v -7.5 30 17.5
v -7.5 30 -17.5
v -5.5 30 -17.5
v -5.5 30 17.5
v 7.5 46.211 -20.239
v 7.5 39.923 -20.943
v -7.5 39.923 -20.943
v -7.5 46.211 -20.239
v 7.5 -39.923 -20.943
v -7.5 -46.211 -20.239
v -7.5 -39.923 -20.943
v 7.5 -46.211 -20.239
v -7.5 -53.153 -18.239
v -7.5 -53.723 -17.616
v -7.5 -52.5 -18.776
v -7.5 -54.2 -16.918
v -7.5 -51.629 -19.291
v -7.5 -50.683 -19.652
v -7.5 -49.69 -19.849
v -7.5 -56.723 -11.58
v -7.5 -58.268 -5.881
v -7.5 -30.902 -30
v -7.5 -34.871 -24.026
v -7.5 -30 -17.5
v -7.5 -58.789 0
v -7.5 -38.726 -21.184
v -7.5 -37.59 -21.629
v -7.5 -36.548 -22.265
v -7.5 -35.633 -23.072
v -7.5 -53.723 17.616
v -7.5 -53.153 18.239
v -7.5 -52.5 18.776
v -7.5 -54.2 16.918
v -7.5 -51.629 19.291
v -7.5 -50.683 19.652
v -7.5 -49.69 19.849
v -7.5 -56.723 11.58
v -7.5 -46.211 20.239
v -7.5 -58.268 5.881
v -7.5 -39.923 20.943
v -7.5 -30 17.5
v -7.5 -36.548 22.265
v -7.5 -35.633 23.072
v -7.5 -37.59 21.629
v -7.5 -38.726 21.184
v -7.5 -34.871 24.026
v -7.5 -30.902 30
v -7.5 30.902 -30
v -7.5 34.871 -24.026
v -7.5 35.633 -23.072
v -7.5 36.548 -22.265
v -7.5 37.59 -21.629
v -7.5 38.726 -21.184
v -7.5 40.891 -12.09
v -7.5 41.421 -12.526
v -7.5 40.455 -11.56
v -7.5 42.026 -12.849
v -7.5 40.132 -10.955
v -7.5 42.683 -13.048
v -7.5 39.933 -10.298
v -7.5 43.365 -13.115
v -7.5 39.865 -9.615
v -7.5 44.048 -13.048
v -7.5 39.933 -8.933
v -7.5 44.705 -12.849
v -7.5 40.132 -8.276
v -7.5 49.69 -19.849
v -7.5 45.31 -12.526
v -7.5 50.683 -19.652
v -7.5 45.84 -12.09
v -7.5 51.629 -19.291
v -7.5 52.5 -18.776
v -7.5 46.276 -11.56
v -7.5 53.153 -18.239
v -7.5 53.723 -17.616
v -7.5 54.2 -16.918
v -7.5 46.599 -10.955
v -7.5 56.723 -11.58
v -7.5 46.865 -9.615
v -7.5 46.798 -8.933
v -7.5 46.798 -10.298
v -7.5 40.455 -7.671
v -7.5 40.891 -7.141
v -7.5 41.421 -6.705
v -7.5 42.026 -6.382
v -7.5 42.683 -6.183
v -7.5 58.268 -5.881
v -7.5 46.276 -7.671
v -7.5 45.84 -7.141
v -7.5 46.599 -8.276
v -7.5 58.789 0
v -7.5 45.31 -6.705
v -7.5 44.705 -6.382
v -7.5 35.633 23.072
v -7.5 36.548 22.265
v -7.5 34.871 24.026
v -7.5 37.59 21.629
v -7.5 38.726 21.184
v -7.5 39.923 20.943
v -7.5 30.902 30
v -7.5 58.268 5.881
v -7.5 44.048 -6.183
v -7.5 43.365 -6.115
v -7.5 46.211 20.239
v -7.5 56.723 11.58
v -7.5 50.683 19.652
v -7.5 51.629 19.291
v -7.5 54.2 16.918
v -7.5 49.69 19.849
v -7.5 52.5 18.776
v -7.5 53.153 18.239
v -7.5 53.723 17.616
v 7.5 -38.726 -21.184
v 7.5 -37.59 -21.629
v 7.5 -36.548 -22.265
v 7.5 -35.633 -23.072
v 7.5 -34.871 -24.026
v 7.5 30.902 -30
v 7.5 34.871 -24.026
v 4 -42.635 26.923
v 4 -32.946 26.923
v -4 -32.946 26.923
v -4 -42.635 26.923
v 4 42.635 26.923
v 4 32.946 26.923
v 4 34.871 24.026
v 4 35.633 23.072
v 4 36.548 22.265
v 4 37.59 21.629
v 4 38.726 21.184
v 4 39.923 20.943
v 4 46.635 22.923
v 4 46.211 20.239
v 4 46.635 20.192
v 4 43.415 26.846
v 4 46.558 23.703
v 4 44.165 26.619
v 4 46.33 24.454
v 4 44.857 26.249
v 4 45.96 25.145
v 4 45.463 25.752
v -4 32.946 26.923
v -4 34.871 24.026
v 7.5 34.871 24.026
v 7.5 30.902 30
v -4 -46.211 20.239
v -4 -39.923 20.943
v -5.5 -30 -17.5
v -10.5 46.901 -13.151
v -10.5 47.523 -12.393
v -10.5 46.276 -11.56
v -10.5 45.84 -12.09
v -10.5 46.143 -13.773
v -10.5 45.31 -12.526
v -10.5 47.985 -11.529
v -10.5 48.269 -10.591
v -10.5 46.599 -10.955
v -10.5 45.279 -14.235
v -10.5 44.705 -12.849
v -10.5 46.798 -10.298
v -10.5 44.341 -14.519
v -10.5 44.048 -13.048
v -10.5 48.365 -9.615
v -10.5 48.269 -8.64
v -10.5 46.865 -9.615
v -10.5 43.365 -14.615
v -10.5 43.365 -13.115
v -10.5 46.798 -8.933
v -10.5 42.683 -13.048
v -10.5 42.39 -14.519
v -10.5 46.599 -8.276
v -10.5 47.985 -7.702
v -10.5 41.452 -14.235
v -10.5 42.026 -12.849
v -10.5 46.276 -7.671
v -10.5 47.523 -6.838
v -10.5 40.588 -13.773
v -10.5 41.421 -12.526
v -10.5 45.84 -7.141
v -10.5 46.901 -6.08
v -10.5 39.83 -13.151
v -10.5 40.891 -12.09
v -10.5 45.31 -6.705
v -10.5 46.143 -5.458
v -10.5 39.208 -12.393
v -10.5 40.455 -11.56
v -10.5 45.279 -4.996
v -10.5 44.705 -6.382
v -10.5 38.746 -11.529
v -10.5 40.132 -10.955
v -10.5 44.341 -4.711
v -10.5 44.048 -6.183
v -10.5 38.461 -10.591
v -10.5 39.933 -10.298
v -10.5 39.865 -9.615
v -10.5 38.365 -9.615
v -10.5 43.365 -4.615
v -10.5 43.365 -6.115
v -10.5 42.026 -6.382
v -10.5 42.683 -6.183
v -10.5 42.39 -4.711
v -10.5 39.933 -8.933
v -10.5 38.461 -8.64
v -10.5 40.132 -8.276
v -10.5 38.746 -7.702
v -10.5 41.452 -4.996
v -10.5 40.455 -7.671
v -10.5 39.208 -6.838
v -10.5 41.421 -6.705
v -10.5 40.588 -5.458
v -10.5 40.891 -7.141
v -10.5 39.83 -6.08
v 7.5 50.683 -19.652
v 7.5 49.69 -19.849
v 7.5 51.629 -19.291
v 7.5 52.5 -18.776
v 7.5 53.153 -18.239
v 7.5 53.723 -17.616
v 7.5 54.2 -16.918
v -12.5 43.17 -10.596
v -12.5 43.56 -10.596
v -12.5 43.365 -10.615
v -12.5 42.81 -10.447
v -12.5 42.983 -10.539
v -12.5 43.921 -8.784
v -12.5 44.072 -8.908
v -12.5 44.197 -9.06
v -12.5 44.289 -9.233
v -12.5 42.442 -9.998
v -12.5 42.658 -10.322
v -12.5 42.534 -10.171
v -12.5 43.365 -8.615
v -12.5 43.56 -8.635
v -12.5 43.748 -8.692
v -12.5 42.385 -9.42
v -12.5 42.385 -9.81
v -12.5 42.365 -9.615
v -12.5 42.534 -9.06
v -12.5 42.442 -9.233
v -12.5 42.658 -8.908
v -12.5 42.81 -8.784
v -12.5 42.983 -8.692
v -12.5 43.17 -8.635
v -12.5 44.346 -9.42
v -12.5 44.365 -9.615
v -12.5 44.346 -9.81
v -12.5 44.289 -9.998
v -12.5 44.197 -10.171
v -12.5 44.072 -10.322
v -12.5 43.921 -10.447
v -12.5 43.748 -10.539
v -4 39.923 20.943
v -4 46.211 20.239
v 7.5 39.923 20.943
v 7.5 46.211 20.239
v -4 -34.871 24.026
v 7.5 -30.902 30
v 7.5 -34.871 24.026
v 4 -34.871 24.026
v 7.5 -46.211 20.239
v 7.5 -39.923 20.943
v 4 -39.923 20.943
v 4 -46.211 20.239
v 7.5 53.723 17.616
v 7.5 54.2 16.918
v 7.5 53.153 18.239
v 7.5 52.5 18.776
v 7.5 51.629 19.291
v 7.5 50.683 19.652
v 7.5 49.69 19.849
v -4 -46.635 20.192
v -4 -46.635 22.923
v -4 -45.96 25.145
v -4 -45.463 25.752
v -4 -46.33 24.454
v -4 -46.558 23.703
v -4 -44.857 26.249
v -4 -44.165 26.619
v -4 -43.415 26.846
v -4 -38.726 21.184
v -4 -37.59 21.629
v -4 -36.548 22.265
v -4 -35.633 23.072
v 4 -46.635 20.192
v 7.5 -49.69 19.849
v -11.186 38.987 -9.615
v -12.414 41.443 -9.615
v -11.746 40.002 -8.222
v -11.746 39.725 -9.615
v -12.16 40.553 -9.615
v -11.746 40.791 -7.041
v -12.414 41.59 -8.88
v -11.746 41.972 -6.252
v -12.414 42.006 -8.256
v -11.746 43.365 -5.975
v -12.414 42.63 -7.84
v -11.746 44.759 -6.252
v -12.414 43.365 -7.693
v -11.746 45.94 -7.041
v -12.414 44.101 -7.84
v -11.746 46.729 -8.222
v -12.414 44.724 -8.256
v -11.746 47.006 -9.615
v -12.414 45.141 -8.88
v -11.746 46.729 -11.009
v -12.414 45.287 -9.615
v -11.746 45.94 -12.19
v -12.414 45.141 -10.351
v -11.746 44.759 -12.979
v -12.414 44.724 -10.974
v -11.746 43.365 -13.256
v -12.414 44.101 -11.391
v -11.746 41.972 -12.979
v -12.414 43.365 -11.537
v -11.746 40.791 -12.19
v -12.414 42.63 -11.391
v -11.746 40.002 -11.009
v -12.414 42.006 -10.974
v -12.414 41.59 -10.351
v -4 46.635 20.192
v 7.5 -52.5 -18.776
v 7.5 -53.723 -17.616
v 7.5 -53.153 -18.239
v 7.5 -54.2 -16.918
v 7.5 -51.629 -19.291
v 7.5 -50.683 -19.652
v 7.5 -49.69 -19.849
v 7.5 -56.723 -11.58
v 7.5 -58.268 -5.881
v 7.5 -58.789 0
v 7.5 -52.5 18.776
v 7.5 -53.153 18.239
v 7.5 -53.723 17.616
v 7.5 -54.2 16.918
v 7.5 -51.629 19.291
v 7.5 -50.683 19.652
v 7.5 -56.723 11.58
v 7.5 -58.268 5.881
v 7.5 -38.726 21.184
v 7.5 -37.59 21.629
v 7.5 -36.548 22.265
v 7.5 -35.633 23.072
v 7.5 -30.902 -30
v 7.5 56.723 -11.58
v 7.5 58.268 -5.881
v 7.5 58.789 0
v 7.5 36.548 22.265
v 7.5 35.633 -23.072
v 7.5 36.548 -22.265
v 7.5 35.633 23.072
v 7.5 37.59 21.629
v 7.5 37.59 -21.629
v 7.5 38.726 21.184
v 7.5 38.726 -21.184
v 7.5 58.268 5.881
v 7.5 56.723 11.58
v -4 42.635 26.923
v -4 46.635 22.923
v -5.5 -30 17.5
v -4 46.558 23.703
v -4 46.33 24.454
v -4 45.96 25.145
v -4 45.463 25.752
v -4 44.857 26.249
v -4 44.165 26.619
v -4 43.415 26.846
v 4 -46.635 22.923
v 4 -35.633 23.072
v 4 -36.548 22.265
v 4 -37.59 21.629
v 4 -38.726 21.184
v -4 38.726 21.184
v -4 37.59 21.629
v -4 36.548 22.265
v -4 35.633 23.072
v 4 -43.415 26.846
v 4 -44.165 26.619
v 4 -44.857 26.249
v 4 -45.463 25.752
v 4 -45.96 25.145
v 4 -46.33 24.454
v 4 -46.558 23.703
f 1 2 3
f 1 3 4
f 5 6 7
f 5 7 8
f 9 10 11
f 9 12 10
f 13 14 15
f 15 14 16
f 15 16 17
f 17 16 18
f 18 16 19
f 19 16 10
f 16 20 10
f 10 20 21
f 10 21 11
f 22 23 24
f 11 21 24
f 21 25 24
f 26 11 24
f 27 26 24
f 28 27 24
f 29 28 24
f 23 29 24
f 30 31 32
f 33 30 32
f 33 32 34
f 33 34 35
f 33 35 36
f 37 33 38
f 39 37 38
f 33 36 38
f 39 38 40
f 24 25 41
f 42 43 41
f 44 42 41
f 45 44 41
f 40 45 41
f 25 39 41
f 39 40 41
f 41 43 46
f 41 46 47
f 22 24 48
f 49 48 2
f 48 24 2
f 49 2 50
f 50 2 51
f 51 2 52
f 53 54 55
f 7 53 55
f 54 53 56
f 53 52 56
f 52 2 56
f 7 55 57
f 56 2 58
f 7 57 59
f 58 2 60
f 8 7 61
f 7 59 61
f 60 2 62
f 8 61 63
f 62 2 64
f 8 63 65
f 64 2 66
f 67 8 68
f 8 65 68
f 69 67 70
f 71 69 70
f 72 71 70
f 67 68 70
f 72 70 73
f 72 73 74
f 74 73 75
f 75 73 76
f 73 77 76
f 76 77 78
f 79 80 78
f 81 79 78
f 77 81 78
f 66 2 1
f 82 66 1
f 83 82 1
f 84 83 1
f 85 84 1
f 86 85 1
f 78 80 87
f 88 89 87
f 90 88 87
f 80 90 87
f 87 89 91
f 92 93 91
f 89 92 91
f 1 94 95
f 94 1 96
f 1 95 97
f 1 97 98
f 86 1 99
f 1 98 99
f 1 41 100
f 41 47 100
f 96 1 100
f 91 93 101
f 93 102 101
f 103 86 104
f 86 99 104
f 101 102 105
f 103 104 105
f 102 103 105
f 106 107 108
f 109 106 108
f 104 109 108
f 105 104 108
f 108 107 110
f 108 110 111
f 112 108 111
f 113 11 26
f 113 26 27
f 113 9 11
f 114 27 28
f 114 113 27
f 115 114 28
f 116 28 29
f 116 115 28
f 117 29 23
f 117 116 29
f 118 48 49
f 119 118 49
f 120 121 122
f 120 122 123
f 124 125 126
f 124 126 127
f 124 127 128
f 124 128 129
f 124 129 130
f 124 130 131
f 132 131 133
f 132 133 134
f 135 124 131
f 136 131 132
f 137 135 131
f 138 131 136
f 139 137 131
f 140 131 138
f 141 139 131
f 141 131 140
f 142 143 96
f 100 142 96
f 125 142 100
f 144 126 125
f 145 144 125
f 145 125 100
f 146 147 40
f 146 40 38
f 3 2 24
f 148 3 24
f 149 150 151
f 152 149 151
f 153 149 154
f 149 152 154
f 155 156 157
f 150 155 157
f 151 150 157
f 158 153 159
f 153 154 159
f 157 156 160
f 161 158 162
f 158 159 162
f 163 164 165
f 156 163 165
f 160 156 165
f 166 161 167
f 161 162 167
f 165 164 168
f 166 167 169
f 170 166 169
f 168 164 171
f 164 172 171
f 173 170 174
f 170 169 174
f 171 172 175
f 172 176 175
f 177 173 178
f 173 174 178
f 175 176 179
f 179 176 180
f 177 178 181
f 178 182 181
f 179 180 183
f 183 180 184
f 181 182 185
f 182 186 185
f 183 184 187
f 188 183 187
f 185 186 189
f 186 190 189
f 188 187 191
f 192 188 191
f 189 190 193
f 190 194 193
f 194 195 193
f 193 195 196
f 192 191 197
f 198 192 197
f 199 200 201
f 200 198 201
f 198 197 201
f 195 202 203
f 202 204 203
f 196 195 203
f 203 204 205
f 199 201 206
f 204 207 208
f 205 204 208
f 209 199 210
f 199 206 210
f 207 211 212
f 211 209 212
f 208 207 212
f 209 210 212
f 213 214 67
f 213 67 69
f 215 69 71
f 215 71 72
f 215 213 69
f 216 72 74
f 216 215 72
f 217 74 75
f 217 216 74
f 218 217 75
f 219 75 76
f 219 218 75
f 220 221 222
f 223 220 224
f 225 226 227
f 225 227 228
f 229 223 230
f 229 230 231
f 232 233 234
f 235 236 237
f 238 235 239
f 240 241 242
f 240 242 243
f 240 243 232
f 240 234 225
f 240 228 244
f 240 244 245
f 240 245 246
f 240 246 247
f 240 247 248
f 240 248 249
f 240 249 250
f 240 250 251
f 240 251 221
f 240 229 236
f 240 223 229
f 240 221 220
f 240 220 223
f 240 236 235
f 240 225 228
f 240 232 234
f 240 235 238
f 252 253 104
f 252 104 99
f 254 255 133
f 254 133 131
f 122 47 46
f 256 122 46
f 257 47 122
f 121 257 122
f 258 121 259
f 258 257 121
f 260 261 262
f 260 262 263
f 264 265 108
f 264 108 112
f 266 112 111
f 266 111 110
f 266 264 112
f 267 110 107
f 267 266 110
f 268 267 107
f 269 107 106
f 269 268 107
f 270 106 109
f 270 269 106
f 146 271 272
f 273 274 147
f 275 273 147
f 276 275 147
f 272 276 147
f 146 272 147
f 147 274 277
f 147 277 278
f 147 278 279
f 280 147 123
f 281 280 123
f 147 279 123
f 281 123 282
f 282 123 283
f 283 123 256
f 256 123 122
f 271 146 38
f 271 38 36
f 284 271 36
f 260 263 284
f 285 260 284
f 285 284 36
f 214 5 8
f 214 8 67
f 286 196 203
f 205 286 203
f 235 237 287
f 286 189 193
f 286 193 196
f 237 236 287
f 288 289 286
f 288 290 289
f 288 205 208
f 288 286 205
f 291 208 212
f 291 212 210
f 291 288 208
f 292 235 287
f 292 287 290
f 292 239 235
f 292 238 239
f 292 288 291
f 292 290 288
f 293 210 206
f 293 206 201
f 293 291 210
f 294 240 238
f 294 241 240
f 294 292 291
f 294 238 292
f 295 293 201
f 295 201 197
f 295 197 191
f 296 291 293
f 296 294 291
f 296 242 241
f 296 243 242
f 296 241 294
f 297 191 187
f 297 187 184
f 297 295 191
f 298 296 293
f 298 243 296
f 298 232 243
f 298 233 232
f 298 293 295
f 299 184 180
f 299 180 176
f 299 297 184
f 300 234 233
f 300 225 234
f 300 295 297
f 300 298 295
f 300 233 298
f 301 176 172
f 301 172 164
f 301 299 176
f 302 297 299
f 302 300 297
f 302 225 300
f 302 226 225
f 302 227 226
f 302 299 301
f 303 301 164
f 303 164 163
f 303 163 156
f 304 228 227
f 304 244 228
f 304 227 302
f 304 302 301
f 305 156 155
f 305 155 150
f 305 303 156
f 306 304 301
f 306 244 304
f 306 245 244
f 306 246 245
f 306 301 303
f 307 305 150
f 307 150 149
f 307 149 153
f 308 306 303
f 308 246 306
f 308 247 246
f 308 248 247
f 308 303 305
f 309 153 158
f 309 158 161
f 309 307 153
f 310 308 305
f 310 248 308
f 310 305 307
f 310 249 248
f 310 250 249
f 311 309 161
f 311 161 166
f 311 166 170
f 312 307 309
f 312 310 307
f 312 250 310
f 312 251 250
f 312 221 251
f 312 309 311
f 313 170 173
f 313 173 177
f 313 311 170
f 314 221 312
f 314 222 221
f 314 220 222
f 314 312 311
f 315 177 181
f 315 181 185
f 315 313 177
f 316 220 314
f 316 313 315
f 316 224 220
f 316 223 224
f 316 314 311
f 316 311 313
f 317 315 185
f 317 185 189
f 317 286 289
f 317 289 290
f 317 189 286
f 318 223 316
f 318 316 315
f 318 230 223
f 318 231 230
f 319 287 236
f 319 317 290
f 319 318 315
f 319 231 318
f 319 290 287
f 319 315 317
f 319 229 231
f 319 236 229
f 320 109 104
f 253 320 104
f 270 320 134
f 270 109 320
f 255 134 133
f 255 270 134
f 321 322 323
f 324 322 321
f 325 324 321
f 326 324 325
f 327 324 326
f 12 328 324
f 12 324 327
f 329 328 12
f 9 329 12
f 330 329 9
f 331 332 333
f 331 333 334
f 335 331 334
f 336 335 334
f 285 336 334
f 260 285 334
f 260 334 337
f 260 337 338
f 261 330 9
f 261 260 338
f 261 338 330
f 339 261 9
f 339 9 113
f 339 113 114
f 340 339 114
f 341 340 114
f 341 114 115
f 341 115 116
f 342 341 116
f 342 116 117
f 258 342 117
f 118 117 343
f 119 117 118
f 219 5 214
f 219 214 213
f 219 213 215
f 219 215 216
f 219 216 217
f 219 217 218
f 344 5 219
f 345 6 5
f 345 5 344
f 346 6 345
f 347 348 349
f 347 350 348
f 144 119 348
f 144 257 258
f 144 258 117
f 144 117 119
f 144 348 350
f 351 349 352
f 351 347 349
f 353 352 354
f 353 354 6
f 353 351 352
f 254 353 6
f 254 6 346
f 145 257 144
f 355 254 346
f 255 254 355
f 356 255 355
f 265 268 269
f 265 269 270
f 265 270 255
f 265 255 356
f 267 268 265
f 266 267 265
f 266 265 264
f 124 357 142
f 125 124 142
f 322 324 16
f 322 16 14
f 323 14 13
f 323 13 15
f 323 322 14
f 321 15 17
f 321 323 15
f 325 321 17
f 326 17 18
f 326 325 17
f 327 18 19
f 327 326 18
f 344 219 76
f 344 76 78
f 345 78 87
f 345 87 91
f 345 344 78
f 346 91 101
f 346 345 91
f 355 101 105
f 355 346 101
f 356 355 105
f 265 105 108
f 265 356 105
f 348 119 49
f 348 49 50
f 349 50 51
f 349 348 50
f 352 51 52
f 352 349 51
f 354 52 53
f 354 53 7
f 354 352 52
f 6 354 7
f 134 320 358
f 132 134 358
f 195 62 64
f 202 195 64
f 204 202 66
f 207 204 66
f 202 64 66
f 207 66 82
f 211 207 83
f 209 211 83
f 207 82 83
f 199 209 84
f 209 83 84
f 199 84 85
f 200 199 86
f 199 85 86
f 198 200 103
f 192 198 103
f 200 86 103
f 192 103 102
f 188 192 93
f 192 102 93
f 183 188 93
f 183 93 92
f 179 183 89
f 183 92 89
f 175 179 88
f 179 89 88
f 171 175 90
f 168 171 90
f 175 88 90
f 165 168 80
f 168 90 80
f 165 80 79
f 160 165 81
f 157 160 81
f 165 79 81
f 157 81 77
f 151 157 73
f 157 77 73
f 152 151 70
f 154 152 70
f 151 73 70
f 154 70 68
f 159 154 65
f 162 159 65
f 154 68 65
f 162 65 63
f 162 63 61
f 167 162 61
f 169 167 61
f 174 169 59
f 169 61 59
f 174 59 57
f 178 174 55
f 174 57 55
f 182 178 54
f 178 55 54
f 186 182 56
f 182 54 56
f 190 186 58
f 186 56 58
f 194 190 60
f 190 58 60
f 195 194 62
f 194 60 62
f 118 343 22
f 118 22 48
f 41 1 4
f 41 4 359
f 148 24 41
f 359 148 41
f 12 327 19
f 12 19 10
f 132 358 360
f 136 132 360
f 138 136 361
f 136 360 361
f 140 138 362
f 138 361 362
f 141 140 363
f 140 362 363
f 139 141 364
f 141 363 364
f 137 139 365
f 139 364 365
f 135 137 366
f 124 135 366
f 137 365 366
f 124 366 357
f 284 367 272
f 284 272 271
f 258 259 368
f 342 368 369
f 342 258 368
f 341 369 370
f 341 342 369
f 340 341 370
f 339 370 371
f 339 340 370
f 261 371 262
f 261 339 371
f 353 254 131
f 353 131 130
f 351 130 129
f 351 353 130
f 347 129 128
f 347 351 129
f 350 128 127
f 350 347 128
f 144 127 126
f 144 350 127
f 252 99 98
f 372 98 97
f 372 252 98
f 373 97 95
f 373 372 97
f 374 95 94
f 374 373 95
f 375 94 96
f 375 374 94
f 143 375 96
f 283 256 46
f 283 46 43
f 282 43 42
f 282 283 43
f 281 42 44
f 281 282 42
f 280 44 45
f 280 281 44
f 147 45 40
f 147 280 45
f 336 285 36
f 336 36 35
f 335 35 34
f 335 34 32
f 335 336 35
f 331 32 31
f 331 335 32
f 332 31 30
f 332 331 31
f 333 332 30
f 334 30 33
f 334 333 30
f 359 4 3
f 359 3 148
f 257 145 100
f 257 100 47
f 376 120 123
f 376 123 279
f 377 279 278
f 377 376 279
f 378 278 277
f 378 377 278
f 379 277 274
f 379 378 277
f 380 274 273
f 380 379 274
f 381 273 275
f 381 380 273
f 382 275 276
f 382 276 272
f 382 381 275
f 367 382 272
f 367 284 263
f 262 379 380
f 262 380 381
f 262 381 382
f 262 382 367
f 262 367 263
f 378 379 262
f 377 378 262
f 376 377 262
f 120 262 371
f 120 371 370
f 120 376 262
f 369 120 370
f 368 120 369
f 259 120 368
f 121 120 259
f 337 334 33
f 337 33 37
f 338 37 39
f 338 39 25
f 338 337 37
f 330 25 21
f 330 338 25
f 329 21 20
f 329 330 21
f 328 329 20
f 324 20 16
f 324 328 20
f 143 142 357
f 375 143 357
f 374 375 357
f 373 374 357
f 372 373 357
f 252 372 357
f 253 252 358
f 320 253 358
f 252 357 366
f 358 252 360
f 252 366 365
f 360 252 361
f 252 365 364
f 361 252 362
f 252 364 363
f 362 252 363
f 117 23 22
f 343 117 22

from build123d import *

# Parameters (mm, degrees)
F1_DEPTH  = 7.5
F3_DEPTH  = 4
F5_R      = 3.5
F6_DEPTH  = 3
F7_R      = 5
F8_DEPTH  = 2
F4_W      = 60
F4_H      = 35
F10_DEPTH = 2


# Not quite as in the source:
# - a fillet or chamfer that OpenCascade refuses, or shapes differently, is made with other operations: its cross-section is extruded or revolved along the edge and cut away or added


with BuildPart() as f1:
    # F0 (on Right) → F1 (new body, symmetric)
    with BuildSketch(Plane.YZ):
        with BuildLine():
            Line((-34.8711436077, -24.0259013658), (-30.9017617255, -30))
            Line((-30.9017617255, -30), (0, -30))
            Line((0, -30), (0, 0))
            Line((0, 0), (-52.5, 0))
            Line((-52.5, 0), (-52.5, -18.7762488504))
            ThreePointArc((-52.5, -18.7762488504), (-51.1634624835, -19.4917800985), (-49.6902439515, -19.8494736223))
            Line((-49.6902439515, -19.8494736223), (-46.2112579103, -20.2390480822))
            Line((-46.2112579103, -20.2390480822), (-39.9225158206, -20.9432570884))
            ThreePointArc((-39.9225158206, -20.9432570884), (-37.0550608987, -21.9245400717), (-34.8711436077, -24.0259013658))
        make_face()
        with BuildLine():
            Line((0, 0), (0, -30))
            Line((0, -30), (30.9017617255, -30))
            Line((30.9017617255, -30), (34.8711436077, -24.0259013658))
            ThreePointArc((34.8711436077, -24.0259013658), (37.0550608987, -21.9245400717), (39.9225158206, -20.9432570884))
            Line((39.9225158206, -20.9432570884), (46.2112579103, -20.2390480822))
            Line((46.2112579103, -20.2390480822), (49.6902439515, -19.8494736223))
            ThreePointArc((49.6902439515, -19.8494736223), (51.1634624835, -19.4917800985), (52.5, -18.7762488504))
            Line((52.5, -18.7762488504), (52.5, 0))
            Line((52.5, 0), (0, 0))
        make_face()
        with BuildLine():
            Line((-52.5, 0), (0, 0))
            Line((0, 0), (0, 30))
            Line((0, 30), (-30.9017617255, 30))
            Line((-30.9017617255, 30), (-34.8711436077, 24.0259013658))
            ThreePointArc((-34.8711436077, 24.0259013658), (-37.0550608987, 21.9245400717), (-39.9225158206, 20.9432570884))
            Line((-39.9225158206, 20.9432570884), (-46.2112579103, 20.2390480822))
            Line((-46.2112579103, 20.2390480822), (-49.6902439515, 19.8494736223))
            ThreePointArc((-49.6902439515, 19.8494736223), (-51.1634624835, 19.4917800985), (-52.5, 18.7762488504))
            Line((-52.5, 18.7762488504), (-52.5, 0))
        make_face()
        with BuildLine():
            Line((0, 30), (0, 0))
            Line((0, 0), (52.5, 0))
            Line((52.5, 0), (52.5, 18.7762488504))
            ThreePointArc((52.5, 18.7762488504), (51.1634624835, 19.4917800985), (49.6902439515, 19.8494736223))
            Line((49.6902439515, 19.8494736223), (46.2112579103, 20.2390480822))
            Line((46.2112579103, 20.2390480822), (39.9225158206, 20.9432570884))
            ThreePointArc((39.9225158206, 20.9432570884), (37.0550608987, 21.9245400717), (34.8711436077, 24.0259013658))
            Line((34.8711436077, 24.0259013658), (30.9017617255, 30))
            Line((30.9017617255, 30), (0, 30))
        make_face()
        with BuildLine():
            Line((58.7885477615, 0), (52.5, 0))
            Line((52.5, 0), (52.5, -18.7762488504))
            ThreePointArc((52.5, -18.7762488504), (53.448824854, -17.9374222983), (54.2004466552, -16.9181268278))
            ThreePointArc((54.2004466552, -16.9181268278), (57.6211742241, -8.7646119013), (58.7885477615, 0))
        make_face()
        with BuildLine():
            Line((52.5, 18.7762488504), (52.5, 0))
            Line((52.5, 0), (58.7885477615, 0))
            ThreePointArc((58.7885477615, 0), (57.6211742241, 8.7646119013), (54.2004466552, 16.9181268278))
            ThreePointArc((54.2004466552, 16.9181268278), (53.448824854, 17.9374222983), (52.5, 18.7762488504))
        make_face()
        with BuildLine():
            Line((-58.7885477615, 0), (-52.5, 0))
            Line((-52.5, 0), (-52.5, 18.7762488504))
            ThreePointArc((-52.5, 18.7762488504), (-53.448824854, 17.9374222983), (-54.2004466552, 16.9181268278))
            ThreePointArc((-54.2004466552, 16.9181268278), (-57.6211742241, 8.7646119013), (-58.7885477615, 0))
        make_face()
        with BuildLine():
            Line((-52.5, -18.7762488504), (-52.5, 0))
            Line((-52.5, 0), (-58.7885477615, 0))
            ThreePointArc((-58.7885477615, 0), (-57.6211742241, -8.7646119013), (-54.2004466552, -16.9181268278))
            ThreePointArc((-54.2004466552, -16.9181268278), (-53.448824854, -17.9374222983), (-52.5, -18.7762488504))
        make_face()
    extrude(amount=F1_DEPTH, both=True)

    # F2 (on Right) → F3 (join, symmetric)
    with BuildSketch(Plane.YZ):
        with BuildLine():
            Line((29.7115407884, 26.9230790436), (29.7115407884, 18.846154213))
            Line((29.7115407884, 18.846154213), (46.6346181929, 18.846154213))
            Line((46.6346181929, 18.846154213), (46.6346181929, 22.9230790436))
            ThreePointArc((46.6346181929, 22.9230790436), (45.4630453177, 25.7515061684), (42.6346181929, 26.9230790436))
            Line((42.6346181929, 26.9230790436), (29.7115407884, 26.9230790436))
        make_face()
        with BuildLine():
            Line((-29.7115407884, 18.846154213), (-29.7115407884, 26.9230790436))
            Line((-29.7115407884, 26.9230790436), (-42.6346181929, 26.9230790436))
            ThreePointArc((-42.6346181929, 26.9230790436), (-45.4630453177, 25.7515061684), (-46.6346181929, 22.9230790436))
            Line((-46.6346181929, 22.9230790436), (-46.6346181929, 18.846154213))
            Line((-46.6346181929, 18.846154213), (-29.7115407884, 18.846154213))
        make_face()
    extrude(amount=F3_DEPTH, both=True)

    # F5 (on face) → F6 (join)
    with BuildSketch(Plane(origin=(-7.5, 0, 0), x_dir=(0, -1, 0), z_dir=(-1, 0, 0))):
        with Locations((-43.3653853834, -9.6153849736)):
            Circle(F5_R)
    extrude(amount=F6_DEPTH)

    # F7 (on face) → F8 (join)
    with BuildSketch(Plane(origin=(-10.5, 0, 0), x_dir=(0, -1, 0), z_dir=(-1, 0, 0))):
        with Locations((-43.3653853834, -9.6153849736)):
            Circle(F7_R)
    extrude(amount=F8_DEPTH)

    # F9: fillet of radius 5 on 1 edges, made by hand

    # F9_s1 → F9_t2 (revolve, cut)
    with BuildSketch(Plane.XY.offset(-9.6153849736)):
        with BuildLine():
            ThreePointArc((-10.5, 38.3653853834), (-11.972135955, 40.1293174059), (-12.5, 42.3653853834))
            Line((-12.5, 42.3653853834), (-12.5, 38.3653853834))
            Line((-12.5, 38.3653853834), (-10.5, 38.3653853834))
        make_face()
    revolve(axis=Axis((-12.5, 43.3653853834, -9.6153849736), (-1, 0, 0)), mode=Mode.SUBTRACT)

    # F4 (on face) → F10 (cut)
    with BuildSketch(Plane(origin=(-7.5, 0, 0), x_dir=(0, -1, 0), z_dir=(-1, 0, 0))):
        Rectangle(F4_W, F4_H)
    extrude(amount=-F10_DEPTH, mode=Mode.SUBTRACT)


solid = f1.part
